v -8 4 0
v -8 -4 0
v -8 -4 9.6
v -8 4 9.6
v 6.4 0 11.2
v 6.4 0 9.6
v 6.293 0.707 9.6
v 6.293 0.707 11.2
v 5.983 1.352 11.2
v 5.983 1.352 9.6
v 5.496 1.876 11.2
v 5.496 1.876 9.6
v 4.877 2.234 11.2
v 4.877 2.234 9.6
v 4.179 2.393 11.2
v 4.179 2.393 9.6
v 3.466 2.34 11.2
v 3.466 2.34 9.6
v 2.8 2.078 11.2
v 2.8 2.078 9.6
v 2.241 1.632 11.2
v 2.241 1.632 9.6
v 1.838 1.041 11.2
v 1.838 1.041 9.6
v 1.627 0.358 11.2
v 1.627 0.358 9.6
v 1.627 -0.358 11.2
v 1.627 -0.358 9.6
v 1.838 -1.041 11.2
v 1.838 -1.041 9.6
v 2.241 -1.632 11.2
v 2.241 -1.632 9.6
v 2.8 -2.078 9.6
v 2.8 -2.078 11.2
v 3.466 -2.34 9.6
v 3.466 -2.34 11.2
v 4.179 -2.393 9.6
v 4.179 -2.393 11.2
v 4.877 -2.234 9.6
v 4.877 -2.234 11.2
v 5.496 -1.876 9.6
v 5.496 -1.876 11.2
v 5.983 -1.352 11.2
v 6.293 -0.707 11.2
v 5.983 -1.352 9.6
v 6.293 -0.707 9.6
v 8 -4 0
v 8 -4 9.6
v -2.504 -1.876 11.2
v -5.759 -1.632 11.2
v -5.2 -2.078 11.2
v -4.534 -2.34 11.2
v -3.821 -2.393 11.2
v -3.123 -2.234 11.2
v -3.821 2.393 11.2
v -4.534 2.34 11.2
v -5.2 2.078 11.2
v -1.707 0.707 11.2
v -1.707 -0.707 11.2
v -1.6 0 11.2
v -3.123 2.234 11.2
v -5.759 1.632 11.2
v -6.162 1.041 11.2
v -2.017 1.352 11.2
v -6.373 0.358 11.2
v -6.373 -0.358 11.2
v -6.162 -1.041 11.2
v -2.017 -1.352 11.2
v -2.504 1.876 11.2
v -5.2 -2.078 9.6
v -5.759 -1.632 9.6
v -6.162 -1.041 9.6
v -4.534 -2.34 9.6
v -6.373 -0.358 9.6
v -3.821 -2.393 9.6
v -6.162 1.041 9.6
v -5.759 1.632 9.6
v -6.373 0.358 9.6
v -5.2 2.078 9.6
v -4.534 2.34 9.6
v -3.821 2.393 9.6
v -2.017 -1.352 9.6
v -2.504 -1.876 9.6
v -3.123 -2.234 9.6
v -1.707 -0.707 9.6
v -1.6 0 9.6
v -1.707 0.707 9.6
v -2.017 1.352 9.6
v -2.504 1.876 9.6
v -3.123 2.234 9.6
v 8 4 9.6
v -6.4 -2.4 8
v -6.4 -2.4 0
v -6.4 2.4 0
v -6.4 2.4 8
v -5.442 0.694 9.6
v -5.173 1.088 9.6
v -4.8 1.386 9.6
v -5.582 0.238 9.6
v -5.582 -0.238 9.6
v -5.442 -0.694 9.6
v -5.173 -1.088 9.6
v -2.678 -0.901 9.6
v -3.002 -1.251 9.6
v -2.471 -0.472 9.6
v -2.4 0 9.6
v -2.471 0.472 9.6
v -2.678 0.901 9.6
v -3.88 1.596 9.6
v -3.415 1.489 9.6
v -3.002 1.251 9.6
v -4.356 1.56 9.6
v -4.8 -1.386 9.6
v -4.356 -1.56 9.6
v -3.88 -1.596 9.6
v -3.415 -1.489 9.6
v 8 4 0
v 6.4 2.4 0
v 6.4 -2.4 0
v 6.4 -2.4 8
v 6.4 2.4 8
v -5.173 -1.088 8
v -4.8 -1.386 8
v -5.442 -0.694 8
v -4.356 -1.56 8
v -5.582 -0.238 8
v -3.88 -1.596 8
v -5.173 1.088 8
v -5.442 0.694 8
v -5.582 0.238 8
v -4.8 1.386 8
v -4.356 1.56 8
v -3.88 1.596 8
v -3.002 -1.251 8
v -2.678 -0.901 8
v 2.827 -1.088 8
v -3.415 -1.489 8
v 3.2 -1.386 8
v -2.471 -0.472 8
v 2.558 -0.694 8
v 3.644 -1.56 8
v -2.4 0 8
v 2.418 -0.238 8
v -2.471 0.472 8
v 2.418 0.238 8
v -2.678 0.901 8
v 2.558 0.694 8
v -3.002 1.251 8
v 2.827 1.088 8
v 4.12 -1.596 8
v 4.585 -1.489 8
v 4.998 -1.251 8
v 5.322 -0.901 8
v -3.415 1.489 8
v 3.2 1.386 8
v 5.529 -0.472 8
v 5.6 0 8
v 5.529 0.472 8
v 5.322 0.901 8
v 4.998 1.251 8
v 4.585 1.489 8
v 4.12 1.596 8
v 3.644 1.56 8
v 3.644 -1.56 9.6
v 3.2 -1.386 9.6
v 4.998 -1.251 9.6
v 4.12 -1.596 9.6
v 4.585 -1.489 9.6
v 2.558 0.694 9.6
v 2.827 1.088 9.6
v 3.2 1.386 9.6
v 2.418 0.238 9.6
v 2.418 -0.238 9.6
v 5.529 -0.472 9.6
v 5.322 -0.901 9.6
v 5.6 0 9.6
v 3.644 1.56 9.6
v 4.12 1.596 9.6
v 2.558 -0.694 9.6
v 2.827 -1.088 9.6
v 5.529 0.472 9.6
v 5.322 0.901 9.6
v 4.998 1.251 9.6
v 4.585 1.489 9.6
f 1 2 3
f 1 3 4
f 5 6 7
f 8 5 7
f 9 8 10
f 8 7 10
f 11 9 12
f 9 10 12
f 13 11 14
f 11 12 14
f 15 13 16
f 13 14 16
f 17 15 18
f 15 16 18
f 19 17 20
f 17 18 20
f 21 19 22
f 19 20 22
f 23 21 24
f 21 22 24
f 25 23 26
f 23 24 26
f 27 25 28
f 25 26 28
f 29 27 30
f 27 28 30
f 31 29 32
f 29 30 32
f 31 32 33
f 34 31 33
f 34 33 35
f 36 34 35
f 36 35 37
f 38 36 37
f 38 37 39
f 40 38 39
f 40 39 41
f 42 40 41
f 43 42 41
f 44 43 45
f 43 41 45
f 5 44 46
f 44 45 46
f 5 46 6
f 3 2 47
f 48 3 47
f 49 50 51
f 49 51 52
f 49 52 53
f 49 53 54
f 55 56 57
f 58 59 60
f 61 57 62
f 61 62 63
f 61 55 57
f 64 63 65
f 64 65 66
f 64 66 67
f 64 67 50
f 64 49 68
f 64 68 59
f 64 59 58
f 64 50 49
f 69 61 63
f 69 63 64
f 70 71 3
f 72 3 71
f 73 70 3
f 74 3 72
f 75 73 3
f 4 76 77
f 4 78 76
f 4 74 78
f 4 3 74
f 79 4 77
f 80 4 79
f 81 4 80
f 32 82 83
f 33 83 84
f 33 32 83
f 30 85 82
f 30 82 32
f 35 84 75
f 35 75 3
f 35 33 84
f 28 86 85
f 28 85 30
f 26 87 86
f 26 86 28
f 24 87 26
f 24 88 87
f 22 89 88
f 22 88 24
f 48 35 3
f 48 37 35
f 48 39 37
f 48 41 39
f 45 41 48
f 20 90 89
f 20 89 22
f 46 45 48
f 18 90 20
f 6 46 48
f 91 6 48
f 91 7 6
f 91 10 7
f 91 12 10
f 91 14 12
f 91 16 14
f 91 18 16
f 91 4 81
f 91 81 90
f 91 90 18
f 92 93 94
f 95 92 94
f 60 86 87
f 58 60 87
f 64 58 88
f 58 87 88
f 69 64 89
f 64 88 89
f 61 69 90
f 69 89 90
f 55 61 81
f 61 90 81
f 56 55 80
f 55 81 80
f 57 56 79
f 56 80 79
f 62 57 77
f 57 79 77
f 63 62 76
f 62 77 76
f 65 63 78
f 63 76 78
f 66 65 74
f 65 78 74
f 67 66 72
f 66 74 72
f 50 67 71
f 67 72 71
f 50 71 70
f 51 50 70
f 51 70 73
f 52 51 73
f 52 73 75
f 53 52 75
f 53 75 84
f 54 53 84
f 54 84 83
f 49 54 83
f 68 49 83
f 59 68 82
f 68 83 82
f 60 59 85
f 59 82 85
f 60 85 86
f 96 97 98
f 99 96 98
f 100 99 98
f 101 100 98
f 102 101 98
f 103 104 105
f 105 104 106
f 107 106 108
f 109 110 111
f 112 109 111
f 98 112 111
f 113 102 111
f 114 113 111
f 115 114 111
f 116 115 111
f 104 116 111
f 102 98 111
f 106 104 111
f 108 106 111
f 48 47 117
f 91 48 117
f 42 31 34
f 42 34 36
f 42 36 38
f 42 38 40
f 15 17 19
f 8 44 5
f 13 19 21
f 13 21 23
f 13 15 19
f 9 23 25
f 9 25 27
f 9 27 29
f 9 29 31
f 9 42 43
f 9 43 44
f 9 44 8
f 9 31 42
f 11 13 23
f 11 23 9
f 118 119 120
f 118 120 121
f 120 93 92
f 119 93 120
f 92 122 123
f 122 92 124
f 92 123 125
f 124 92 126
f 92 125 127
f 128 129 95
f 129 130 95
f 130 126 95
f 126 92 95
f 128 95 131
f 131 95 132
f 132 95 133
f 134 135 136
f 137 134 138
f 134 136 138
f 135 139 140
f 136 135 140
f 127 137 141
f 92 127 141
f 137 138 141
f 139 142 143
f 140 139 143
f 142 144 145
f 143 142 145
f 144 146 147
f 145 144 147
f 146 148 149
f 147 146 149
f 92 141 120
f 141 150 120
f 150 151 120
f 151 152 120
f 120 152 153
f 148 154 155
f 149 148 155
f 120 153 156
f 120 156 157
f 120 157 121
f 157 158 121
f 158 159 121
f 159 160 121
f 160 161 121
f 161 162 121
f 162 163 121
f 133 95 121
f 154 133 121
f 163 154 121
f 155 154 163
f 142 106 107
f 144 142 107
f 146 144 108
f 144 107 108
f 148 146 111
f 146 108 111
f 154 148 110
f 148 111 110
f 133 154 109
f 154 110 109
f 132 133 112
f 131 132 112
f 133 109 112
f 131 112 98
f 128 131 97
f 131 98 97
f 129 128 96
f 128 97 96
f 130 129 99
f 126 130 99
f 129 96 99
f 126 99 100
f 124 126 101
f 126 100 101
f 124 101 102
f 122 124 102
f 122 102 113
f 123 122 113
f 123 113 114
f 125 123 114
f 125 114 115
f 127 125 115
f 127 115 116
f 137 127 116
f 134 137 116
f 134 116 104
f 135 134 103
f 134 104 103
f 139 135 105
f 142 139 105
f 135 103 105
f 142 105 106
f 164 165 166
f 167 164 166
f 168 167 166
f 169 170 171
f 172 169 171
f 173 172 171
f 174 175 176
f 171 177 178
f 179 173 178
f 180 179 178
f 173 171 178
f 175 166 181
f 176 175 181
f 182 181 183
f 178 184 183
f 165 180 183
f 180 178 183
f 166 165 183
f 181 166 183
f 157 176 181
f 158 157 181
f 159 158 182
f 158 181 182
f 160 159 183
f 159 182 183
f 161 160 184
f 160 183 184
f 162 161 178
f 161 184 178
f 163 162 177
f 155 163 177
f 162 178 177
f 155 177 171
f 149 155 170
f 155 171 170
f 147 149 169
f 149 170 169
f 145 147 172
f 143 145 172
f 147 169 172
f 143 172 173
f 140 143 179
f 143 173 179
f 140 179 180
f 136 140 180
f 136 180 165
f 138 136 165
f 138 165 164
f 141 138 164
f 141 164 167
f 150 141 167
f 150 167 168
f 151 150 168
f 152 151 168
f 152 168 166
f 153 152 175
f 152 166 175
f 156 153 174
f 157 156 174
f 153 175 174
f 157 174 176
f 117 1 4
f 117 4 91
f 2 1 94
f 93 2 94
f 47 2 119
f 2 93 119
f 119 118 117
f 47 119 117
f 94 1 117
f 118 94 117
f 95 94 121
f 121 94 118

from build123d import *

# Parameters (mm, degrees)
F0_W     = 16
F0_H     = 8
F0_W_2   = 12.8
F0_H_2   = 4.8
F1_DEPTH = 9.6
F2_DEPTH = 8
F3_R     = 1.6
F4_DEPTH = 1.6
F5_R     = 2.4
F6_DEPTH = 1.6


with BuildPart() as f1:
    # F0 (on Top) → F1 (new body)
    with BuildSketch(Plane.XY):
        Rectangle(F0_W, F0_H)
        Rectangle(F0_W_2, F0_H_2, mode=Mode.SUBTRACT)
        Rectangle(F0_W_2, F0_H_2)
    extrude(amount=F1_DEPTH)

    # F0 (on Top) → F2 (cut)
    with BuildSketch(Plane.XY):
        Rectangle(F0_W_2, F0_H_2)
    extrude(amount=F2_DEPTH, mode=Mode.SUBTRACT)

    # F3 (on face) → F4 (cut)
    with BuildSketch(Plane.XY.offset(9.6)):
        with Locations((4, 0)):
            Circle(F3_R)
        with Locations((-4, 0)):
            Circle(F3_R)
    extrude(amount=-F4_DEPTH, mode=Mode.SUBTRACT)

    # F5 (on face) → F6 (join)
    with BuildSketch(Plane.XY.offset(9.6)):
        with Locations((-4, 0)):
            Circle(F5_R)
        with Locations((4, 0)):
            Circle(F5_R)
    extrude(amount=F6_DEPTH)


solid = f1.part
